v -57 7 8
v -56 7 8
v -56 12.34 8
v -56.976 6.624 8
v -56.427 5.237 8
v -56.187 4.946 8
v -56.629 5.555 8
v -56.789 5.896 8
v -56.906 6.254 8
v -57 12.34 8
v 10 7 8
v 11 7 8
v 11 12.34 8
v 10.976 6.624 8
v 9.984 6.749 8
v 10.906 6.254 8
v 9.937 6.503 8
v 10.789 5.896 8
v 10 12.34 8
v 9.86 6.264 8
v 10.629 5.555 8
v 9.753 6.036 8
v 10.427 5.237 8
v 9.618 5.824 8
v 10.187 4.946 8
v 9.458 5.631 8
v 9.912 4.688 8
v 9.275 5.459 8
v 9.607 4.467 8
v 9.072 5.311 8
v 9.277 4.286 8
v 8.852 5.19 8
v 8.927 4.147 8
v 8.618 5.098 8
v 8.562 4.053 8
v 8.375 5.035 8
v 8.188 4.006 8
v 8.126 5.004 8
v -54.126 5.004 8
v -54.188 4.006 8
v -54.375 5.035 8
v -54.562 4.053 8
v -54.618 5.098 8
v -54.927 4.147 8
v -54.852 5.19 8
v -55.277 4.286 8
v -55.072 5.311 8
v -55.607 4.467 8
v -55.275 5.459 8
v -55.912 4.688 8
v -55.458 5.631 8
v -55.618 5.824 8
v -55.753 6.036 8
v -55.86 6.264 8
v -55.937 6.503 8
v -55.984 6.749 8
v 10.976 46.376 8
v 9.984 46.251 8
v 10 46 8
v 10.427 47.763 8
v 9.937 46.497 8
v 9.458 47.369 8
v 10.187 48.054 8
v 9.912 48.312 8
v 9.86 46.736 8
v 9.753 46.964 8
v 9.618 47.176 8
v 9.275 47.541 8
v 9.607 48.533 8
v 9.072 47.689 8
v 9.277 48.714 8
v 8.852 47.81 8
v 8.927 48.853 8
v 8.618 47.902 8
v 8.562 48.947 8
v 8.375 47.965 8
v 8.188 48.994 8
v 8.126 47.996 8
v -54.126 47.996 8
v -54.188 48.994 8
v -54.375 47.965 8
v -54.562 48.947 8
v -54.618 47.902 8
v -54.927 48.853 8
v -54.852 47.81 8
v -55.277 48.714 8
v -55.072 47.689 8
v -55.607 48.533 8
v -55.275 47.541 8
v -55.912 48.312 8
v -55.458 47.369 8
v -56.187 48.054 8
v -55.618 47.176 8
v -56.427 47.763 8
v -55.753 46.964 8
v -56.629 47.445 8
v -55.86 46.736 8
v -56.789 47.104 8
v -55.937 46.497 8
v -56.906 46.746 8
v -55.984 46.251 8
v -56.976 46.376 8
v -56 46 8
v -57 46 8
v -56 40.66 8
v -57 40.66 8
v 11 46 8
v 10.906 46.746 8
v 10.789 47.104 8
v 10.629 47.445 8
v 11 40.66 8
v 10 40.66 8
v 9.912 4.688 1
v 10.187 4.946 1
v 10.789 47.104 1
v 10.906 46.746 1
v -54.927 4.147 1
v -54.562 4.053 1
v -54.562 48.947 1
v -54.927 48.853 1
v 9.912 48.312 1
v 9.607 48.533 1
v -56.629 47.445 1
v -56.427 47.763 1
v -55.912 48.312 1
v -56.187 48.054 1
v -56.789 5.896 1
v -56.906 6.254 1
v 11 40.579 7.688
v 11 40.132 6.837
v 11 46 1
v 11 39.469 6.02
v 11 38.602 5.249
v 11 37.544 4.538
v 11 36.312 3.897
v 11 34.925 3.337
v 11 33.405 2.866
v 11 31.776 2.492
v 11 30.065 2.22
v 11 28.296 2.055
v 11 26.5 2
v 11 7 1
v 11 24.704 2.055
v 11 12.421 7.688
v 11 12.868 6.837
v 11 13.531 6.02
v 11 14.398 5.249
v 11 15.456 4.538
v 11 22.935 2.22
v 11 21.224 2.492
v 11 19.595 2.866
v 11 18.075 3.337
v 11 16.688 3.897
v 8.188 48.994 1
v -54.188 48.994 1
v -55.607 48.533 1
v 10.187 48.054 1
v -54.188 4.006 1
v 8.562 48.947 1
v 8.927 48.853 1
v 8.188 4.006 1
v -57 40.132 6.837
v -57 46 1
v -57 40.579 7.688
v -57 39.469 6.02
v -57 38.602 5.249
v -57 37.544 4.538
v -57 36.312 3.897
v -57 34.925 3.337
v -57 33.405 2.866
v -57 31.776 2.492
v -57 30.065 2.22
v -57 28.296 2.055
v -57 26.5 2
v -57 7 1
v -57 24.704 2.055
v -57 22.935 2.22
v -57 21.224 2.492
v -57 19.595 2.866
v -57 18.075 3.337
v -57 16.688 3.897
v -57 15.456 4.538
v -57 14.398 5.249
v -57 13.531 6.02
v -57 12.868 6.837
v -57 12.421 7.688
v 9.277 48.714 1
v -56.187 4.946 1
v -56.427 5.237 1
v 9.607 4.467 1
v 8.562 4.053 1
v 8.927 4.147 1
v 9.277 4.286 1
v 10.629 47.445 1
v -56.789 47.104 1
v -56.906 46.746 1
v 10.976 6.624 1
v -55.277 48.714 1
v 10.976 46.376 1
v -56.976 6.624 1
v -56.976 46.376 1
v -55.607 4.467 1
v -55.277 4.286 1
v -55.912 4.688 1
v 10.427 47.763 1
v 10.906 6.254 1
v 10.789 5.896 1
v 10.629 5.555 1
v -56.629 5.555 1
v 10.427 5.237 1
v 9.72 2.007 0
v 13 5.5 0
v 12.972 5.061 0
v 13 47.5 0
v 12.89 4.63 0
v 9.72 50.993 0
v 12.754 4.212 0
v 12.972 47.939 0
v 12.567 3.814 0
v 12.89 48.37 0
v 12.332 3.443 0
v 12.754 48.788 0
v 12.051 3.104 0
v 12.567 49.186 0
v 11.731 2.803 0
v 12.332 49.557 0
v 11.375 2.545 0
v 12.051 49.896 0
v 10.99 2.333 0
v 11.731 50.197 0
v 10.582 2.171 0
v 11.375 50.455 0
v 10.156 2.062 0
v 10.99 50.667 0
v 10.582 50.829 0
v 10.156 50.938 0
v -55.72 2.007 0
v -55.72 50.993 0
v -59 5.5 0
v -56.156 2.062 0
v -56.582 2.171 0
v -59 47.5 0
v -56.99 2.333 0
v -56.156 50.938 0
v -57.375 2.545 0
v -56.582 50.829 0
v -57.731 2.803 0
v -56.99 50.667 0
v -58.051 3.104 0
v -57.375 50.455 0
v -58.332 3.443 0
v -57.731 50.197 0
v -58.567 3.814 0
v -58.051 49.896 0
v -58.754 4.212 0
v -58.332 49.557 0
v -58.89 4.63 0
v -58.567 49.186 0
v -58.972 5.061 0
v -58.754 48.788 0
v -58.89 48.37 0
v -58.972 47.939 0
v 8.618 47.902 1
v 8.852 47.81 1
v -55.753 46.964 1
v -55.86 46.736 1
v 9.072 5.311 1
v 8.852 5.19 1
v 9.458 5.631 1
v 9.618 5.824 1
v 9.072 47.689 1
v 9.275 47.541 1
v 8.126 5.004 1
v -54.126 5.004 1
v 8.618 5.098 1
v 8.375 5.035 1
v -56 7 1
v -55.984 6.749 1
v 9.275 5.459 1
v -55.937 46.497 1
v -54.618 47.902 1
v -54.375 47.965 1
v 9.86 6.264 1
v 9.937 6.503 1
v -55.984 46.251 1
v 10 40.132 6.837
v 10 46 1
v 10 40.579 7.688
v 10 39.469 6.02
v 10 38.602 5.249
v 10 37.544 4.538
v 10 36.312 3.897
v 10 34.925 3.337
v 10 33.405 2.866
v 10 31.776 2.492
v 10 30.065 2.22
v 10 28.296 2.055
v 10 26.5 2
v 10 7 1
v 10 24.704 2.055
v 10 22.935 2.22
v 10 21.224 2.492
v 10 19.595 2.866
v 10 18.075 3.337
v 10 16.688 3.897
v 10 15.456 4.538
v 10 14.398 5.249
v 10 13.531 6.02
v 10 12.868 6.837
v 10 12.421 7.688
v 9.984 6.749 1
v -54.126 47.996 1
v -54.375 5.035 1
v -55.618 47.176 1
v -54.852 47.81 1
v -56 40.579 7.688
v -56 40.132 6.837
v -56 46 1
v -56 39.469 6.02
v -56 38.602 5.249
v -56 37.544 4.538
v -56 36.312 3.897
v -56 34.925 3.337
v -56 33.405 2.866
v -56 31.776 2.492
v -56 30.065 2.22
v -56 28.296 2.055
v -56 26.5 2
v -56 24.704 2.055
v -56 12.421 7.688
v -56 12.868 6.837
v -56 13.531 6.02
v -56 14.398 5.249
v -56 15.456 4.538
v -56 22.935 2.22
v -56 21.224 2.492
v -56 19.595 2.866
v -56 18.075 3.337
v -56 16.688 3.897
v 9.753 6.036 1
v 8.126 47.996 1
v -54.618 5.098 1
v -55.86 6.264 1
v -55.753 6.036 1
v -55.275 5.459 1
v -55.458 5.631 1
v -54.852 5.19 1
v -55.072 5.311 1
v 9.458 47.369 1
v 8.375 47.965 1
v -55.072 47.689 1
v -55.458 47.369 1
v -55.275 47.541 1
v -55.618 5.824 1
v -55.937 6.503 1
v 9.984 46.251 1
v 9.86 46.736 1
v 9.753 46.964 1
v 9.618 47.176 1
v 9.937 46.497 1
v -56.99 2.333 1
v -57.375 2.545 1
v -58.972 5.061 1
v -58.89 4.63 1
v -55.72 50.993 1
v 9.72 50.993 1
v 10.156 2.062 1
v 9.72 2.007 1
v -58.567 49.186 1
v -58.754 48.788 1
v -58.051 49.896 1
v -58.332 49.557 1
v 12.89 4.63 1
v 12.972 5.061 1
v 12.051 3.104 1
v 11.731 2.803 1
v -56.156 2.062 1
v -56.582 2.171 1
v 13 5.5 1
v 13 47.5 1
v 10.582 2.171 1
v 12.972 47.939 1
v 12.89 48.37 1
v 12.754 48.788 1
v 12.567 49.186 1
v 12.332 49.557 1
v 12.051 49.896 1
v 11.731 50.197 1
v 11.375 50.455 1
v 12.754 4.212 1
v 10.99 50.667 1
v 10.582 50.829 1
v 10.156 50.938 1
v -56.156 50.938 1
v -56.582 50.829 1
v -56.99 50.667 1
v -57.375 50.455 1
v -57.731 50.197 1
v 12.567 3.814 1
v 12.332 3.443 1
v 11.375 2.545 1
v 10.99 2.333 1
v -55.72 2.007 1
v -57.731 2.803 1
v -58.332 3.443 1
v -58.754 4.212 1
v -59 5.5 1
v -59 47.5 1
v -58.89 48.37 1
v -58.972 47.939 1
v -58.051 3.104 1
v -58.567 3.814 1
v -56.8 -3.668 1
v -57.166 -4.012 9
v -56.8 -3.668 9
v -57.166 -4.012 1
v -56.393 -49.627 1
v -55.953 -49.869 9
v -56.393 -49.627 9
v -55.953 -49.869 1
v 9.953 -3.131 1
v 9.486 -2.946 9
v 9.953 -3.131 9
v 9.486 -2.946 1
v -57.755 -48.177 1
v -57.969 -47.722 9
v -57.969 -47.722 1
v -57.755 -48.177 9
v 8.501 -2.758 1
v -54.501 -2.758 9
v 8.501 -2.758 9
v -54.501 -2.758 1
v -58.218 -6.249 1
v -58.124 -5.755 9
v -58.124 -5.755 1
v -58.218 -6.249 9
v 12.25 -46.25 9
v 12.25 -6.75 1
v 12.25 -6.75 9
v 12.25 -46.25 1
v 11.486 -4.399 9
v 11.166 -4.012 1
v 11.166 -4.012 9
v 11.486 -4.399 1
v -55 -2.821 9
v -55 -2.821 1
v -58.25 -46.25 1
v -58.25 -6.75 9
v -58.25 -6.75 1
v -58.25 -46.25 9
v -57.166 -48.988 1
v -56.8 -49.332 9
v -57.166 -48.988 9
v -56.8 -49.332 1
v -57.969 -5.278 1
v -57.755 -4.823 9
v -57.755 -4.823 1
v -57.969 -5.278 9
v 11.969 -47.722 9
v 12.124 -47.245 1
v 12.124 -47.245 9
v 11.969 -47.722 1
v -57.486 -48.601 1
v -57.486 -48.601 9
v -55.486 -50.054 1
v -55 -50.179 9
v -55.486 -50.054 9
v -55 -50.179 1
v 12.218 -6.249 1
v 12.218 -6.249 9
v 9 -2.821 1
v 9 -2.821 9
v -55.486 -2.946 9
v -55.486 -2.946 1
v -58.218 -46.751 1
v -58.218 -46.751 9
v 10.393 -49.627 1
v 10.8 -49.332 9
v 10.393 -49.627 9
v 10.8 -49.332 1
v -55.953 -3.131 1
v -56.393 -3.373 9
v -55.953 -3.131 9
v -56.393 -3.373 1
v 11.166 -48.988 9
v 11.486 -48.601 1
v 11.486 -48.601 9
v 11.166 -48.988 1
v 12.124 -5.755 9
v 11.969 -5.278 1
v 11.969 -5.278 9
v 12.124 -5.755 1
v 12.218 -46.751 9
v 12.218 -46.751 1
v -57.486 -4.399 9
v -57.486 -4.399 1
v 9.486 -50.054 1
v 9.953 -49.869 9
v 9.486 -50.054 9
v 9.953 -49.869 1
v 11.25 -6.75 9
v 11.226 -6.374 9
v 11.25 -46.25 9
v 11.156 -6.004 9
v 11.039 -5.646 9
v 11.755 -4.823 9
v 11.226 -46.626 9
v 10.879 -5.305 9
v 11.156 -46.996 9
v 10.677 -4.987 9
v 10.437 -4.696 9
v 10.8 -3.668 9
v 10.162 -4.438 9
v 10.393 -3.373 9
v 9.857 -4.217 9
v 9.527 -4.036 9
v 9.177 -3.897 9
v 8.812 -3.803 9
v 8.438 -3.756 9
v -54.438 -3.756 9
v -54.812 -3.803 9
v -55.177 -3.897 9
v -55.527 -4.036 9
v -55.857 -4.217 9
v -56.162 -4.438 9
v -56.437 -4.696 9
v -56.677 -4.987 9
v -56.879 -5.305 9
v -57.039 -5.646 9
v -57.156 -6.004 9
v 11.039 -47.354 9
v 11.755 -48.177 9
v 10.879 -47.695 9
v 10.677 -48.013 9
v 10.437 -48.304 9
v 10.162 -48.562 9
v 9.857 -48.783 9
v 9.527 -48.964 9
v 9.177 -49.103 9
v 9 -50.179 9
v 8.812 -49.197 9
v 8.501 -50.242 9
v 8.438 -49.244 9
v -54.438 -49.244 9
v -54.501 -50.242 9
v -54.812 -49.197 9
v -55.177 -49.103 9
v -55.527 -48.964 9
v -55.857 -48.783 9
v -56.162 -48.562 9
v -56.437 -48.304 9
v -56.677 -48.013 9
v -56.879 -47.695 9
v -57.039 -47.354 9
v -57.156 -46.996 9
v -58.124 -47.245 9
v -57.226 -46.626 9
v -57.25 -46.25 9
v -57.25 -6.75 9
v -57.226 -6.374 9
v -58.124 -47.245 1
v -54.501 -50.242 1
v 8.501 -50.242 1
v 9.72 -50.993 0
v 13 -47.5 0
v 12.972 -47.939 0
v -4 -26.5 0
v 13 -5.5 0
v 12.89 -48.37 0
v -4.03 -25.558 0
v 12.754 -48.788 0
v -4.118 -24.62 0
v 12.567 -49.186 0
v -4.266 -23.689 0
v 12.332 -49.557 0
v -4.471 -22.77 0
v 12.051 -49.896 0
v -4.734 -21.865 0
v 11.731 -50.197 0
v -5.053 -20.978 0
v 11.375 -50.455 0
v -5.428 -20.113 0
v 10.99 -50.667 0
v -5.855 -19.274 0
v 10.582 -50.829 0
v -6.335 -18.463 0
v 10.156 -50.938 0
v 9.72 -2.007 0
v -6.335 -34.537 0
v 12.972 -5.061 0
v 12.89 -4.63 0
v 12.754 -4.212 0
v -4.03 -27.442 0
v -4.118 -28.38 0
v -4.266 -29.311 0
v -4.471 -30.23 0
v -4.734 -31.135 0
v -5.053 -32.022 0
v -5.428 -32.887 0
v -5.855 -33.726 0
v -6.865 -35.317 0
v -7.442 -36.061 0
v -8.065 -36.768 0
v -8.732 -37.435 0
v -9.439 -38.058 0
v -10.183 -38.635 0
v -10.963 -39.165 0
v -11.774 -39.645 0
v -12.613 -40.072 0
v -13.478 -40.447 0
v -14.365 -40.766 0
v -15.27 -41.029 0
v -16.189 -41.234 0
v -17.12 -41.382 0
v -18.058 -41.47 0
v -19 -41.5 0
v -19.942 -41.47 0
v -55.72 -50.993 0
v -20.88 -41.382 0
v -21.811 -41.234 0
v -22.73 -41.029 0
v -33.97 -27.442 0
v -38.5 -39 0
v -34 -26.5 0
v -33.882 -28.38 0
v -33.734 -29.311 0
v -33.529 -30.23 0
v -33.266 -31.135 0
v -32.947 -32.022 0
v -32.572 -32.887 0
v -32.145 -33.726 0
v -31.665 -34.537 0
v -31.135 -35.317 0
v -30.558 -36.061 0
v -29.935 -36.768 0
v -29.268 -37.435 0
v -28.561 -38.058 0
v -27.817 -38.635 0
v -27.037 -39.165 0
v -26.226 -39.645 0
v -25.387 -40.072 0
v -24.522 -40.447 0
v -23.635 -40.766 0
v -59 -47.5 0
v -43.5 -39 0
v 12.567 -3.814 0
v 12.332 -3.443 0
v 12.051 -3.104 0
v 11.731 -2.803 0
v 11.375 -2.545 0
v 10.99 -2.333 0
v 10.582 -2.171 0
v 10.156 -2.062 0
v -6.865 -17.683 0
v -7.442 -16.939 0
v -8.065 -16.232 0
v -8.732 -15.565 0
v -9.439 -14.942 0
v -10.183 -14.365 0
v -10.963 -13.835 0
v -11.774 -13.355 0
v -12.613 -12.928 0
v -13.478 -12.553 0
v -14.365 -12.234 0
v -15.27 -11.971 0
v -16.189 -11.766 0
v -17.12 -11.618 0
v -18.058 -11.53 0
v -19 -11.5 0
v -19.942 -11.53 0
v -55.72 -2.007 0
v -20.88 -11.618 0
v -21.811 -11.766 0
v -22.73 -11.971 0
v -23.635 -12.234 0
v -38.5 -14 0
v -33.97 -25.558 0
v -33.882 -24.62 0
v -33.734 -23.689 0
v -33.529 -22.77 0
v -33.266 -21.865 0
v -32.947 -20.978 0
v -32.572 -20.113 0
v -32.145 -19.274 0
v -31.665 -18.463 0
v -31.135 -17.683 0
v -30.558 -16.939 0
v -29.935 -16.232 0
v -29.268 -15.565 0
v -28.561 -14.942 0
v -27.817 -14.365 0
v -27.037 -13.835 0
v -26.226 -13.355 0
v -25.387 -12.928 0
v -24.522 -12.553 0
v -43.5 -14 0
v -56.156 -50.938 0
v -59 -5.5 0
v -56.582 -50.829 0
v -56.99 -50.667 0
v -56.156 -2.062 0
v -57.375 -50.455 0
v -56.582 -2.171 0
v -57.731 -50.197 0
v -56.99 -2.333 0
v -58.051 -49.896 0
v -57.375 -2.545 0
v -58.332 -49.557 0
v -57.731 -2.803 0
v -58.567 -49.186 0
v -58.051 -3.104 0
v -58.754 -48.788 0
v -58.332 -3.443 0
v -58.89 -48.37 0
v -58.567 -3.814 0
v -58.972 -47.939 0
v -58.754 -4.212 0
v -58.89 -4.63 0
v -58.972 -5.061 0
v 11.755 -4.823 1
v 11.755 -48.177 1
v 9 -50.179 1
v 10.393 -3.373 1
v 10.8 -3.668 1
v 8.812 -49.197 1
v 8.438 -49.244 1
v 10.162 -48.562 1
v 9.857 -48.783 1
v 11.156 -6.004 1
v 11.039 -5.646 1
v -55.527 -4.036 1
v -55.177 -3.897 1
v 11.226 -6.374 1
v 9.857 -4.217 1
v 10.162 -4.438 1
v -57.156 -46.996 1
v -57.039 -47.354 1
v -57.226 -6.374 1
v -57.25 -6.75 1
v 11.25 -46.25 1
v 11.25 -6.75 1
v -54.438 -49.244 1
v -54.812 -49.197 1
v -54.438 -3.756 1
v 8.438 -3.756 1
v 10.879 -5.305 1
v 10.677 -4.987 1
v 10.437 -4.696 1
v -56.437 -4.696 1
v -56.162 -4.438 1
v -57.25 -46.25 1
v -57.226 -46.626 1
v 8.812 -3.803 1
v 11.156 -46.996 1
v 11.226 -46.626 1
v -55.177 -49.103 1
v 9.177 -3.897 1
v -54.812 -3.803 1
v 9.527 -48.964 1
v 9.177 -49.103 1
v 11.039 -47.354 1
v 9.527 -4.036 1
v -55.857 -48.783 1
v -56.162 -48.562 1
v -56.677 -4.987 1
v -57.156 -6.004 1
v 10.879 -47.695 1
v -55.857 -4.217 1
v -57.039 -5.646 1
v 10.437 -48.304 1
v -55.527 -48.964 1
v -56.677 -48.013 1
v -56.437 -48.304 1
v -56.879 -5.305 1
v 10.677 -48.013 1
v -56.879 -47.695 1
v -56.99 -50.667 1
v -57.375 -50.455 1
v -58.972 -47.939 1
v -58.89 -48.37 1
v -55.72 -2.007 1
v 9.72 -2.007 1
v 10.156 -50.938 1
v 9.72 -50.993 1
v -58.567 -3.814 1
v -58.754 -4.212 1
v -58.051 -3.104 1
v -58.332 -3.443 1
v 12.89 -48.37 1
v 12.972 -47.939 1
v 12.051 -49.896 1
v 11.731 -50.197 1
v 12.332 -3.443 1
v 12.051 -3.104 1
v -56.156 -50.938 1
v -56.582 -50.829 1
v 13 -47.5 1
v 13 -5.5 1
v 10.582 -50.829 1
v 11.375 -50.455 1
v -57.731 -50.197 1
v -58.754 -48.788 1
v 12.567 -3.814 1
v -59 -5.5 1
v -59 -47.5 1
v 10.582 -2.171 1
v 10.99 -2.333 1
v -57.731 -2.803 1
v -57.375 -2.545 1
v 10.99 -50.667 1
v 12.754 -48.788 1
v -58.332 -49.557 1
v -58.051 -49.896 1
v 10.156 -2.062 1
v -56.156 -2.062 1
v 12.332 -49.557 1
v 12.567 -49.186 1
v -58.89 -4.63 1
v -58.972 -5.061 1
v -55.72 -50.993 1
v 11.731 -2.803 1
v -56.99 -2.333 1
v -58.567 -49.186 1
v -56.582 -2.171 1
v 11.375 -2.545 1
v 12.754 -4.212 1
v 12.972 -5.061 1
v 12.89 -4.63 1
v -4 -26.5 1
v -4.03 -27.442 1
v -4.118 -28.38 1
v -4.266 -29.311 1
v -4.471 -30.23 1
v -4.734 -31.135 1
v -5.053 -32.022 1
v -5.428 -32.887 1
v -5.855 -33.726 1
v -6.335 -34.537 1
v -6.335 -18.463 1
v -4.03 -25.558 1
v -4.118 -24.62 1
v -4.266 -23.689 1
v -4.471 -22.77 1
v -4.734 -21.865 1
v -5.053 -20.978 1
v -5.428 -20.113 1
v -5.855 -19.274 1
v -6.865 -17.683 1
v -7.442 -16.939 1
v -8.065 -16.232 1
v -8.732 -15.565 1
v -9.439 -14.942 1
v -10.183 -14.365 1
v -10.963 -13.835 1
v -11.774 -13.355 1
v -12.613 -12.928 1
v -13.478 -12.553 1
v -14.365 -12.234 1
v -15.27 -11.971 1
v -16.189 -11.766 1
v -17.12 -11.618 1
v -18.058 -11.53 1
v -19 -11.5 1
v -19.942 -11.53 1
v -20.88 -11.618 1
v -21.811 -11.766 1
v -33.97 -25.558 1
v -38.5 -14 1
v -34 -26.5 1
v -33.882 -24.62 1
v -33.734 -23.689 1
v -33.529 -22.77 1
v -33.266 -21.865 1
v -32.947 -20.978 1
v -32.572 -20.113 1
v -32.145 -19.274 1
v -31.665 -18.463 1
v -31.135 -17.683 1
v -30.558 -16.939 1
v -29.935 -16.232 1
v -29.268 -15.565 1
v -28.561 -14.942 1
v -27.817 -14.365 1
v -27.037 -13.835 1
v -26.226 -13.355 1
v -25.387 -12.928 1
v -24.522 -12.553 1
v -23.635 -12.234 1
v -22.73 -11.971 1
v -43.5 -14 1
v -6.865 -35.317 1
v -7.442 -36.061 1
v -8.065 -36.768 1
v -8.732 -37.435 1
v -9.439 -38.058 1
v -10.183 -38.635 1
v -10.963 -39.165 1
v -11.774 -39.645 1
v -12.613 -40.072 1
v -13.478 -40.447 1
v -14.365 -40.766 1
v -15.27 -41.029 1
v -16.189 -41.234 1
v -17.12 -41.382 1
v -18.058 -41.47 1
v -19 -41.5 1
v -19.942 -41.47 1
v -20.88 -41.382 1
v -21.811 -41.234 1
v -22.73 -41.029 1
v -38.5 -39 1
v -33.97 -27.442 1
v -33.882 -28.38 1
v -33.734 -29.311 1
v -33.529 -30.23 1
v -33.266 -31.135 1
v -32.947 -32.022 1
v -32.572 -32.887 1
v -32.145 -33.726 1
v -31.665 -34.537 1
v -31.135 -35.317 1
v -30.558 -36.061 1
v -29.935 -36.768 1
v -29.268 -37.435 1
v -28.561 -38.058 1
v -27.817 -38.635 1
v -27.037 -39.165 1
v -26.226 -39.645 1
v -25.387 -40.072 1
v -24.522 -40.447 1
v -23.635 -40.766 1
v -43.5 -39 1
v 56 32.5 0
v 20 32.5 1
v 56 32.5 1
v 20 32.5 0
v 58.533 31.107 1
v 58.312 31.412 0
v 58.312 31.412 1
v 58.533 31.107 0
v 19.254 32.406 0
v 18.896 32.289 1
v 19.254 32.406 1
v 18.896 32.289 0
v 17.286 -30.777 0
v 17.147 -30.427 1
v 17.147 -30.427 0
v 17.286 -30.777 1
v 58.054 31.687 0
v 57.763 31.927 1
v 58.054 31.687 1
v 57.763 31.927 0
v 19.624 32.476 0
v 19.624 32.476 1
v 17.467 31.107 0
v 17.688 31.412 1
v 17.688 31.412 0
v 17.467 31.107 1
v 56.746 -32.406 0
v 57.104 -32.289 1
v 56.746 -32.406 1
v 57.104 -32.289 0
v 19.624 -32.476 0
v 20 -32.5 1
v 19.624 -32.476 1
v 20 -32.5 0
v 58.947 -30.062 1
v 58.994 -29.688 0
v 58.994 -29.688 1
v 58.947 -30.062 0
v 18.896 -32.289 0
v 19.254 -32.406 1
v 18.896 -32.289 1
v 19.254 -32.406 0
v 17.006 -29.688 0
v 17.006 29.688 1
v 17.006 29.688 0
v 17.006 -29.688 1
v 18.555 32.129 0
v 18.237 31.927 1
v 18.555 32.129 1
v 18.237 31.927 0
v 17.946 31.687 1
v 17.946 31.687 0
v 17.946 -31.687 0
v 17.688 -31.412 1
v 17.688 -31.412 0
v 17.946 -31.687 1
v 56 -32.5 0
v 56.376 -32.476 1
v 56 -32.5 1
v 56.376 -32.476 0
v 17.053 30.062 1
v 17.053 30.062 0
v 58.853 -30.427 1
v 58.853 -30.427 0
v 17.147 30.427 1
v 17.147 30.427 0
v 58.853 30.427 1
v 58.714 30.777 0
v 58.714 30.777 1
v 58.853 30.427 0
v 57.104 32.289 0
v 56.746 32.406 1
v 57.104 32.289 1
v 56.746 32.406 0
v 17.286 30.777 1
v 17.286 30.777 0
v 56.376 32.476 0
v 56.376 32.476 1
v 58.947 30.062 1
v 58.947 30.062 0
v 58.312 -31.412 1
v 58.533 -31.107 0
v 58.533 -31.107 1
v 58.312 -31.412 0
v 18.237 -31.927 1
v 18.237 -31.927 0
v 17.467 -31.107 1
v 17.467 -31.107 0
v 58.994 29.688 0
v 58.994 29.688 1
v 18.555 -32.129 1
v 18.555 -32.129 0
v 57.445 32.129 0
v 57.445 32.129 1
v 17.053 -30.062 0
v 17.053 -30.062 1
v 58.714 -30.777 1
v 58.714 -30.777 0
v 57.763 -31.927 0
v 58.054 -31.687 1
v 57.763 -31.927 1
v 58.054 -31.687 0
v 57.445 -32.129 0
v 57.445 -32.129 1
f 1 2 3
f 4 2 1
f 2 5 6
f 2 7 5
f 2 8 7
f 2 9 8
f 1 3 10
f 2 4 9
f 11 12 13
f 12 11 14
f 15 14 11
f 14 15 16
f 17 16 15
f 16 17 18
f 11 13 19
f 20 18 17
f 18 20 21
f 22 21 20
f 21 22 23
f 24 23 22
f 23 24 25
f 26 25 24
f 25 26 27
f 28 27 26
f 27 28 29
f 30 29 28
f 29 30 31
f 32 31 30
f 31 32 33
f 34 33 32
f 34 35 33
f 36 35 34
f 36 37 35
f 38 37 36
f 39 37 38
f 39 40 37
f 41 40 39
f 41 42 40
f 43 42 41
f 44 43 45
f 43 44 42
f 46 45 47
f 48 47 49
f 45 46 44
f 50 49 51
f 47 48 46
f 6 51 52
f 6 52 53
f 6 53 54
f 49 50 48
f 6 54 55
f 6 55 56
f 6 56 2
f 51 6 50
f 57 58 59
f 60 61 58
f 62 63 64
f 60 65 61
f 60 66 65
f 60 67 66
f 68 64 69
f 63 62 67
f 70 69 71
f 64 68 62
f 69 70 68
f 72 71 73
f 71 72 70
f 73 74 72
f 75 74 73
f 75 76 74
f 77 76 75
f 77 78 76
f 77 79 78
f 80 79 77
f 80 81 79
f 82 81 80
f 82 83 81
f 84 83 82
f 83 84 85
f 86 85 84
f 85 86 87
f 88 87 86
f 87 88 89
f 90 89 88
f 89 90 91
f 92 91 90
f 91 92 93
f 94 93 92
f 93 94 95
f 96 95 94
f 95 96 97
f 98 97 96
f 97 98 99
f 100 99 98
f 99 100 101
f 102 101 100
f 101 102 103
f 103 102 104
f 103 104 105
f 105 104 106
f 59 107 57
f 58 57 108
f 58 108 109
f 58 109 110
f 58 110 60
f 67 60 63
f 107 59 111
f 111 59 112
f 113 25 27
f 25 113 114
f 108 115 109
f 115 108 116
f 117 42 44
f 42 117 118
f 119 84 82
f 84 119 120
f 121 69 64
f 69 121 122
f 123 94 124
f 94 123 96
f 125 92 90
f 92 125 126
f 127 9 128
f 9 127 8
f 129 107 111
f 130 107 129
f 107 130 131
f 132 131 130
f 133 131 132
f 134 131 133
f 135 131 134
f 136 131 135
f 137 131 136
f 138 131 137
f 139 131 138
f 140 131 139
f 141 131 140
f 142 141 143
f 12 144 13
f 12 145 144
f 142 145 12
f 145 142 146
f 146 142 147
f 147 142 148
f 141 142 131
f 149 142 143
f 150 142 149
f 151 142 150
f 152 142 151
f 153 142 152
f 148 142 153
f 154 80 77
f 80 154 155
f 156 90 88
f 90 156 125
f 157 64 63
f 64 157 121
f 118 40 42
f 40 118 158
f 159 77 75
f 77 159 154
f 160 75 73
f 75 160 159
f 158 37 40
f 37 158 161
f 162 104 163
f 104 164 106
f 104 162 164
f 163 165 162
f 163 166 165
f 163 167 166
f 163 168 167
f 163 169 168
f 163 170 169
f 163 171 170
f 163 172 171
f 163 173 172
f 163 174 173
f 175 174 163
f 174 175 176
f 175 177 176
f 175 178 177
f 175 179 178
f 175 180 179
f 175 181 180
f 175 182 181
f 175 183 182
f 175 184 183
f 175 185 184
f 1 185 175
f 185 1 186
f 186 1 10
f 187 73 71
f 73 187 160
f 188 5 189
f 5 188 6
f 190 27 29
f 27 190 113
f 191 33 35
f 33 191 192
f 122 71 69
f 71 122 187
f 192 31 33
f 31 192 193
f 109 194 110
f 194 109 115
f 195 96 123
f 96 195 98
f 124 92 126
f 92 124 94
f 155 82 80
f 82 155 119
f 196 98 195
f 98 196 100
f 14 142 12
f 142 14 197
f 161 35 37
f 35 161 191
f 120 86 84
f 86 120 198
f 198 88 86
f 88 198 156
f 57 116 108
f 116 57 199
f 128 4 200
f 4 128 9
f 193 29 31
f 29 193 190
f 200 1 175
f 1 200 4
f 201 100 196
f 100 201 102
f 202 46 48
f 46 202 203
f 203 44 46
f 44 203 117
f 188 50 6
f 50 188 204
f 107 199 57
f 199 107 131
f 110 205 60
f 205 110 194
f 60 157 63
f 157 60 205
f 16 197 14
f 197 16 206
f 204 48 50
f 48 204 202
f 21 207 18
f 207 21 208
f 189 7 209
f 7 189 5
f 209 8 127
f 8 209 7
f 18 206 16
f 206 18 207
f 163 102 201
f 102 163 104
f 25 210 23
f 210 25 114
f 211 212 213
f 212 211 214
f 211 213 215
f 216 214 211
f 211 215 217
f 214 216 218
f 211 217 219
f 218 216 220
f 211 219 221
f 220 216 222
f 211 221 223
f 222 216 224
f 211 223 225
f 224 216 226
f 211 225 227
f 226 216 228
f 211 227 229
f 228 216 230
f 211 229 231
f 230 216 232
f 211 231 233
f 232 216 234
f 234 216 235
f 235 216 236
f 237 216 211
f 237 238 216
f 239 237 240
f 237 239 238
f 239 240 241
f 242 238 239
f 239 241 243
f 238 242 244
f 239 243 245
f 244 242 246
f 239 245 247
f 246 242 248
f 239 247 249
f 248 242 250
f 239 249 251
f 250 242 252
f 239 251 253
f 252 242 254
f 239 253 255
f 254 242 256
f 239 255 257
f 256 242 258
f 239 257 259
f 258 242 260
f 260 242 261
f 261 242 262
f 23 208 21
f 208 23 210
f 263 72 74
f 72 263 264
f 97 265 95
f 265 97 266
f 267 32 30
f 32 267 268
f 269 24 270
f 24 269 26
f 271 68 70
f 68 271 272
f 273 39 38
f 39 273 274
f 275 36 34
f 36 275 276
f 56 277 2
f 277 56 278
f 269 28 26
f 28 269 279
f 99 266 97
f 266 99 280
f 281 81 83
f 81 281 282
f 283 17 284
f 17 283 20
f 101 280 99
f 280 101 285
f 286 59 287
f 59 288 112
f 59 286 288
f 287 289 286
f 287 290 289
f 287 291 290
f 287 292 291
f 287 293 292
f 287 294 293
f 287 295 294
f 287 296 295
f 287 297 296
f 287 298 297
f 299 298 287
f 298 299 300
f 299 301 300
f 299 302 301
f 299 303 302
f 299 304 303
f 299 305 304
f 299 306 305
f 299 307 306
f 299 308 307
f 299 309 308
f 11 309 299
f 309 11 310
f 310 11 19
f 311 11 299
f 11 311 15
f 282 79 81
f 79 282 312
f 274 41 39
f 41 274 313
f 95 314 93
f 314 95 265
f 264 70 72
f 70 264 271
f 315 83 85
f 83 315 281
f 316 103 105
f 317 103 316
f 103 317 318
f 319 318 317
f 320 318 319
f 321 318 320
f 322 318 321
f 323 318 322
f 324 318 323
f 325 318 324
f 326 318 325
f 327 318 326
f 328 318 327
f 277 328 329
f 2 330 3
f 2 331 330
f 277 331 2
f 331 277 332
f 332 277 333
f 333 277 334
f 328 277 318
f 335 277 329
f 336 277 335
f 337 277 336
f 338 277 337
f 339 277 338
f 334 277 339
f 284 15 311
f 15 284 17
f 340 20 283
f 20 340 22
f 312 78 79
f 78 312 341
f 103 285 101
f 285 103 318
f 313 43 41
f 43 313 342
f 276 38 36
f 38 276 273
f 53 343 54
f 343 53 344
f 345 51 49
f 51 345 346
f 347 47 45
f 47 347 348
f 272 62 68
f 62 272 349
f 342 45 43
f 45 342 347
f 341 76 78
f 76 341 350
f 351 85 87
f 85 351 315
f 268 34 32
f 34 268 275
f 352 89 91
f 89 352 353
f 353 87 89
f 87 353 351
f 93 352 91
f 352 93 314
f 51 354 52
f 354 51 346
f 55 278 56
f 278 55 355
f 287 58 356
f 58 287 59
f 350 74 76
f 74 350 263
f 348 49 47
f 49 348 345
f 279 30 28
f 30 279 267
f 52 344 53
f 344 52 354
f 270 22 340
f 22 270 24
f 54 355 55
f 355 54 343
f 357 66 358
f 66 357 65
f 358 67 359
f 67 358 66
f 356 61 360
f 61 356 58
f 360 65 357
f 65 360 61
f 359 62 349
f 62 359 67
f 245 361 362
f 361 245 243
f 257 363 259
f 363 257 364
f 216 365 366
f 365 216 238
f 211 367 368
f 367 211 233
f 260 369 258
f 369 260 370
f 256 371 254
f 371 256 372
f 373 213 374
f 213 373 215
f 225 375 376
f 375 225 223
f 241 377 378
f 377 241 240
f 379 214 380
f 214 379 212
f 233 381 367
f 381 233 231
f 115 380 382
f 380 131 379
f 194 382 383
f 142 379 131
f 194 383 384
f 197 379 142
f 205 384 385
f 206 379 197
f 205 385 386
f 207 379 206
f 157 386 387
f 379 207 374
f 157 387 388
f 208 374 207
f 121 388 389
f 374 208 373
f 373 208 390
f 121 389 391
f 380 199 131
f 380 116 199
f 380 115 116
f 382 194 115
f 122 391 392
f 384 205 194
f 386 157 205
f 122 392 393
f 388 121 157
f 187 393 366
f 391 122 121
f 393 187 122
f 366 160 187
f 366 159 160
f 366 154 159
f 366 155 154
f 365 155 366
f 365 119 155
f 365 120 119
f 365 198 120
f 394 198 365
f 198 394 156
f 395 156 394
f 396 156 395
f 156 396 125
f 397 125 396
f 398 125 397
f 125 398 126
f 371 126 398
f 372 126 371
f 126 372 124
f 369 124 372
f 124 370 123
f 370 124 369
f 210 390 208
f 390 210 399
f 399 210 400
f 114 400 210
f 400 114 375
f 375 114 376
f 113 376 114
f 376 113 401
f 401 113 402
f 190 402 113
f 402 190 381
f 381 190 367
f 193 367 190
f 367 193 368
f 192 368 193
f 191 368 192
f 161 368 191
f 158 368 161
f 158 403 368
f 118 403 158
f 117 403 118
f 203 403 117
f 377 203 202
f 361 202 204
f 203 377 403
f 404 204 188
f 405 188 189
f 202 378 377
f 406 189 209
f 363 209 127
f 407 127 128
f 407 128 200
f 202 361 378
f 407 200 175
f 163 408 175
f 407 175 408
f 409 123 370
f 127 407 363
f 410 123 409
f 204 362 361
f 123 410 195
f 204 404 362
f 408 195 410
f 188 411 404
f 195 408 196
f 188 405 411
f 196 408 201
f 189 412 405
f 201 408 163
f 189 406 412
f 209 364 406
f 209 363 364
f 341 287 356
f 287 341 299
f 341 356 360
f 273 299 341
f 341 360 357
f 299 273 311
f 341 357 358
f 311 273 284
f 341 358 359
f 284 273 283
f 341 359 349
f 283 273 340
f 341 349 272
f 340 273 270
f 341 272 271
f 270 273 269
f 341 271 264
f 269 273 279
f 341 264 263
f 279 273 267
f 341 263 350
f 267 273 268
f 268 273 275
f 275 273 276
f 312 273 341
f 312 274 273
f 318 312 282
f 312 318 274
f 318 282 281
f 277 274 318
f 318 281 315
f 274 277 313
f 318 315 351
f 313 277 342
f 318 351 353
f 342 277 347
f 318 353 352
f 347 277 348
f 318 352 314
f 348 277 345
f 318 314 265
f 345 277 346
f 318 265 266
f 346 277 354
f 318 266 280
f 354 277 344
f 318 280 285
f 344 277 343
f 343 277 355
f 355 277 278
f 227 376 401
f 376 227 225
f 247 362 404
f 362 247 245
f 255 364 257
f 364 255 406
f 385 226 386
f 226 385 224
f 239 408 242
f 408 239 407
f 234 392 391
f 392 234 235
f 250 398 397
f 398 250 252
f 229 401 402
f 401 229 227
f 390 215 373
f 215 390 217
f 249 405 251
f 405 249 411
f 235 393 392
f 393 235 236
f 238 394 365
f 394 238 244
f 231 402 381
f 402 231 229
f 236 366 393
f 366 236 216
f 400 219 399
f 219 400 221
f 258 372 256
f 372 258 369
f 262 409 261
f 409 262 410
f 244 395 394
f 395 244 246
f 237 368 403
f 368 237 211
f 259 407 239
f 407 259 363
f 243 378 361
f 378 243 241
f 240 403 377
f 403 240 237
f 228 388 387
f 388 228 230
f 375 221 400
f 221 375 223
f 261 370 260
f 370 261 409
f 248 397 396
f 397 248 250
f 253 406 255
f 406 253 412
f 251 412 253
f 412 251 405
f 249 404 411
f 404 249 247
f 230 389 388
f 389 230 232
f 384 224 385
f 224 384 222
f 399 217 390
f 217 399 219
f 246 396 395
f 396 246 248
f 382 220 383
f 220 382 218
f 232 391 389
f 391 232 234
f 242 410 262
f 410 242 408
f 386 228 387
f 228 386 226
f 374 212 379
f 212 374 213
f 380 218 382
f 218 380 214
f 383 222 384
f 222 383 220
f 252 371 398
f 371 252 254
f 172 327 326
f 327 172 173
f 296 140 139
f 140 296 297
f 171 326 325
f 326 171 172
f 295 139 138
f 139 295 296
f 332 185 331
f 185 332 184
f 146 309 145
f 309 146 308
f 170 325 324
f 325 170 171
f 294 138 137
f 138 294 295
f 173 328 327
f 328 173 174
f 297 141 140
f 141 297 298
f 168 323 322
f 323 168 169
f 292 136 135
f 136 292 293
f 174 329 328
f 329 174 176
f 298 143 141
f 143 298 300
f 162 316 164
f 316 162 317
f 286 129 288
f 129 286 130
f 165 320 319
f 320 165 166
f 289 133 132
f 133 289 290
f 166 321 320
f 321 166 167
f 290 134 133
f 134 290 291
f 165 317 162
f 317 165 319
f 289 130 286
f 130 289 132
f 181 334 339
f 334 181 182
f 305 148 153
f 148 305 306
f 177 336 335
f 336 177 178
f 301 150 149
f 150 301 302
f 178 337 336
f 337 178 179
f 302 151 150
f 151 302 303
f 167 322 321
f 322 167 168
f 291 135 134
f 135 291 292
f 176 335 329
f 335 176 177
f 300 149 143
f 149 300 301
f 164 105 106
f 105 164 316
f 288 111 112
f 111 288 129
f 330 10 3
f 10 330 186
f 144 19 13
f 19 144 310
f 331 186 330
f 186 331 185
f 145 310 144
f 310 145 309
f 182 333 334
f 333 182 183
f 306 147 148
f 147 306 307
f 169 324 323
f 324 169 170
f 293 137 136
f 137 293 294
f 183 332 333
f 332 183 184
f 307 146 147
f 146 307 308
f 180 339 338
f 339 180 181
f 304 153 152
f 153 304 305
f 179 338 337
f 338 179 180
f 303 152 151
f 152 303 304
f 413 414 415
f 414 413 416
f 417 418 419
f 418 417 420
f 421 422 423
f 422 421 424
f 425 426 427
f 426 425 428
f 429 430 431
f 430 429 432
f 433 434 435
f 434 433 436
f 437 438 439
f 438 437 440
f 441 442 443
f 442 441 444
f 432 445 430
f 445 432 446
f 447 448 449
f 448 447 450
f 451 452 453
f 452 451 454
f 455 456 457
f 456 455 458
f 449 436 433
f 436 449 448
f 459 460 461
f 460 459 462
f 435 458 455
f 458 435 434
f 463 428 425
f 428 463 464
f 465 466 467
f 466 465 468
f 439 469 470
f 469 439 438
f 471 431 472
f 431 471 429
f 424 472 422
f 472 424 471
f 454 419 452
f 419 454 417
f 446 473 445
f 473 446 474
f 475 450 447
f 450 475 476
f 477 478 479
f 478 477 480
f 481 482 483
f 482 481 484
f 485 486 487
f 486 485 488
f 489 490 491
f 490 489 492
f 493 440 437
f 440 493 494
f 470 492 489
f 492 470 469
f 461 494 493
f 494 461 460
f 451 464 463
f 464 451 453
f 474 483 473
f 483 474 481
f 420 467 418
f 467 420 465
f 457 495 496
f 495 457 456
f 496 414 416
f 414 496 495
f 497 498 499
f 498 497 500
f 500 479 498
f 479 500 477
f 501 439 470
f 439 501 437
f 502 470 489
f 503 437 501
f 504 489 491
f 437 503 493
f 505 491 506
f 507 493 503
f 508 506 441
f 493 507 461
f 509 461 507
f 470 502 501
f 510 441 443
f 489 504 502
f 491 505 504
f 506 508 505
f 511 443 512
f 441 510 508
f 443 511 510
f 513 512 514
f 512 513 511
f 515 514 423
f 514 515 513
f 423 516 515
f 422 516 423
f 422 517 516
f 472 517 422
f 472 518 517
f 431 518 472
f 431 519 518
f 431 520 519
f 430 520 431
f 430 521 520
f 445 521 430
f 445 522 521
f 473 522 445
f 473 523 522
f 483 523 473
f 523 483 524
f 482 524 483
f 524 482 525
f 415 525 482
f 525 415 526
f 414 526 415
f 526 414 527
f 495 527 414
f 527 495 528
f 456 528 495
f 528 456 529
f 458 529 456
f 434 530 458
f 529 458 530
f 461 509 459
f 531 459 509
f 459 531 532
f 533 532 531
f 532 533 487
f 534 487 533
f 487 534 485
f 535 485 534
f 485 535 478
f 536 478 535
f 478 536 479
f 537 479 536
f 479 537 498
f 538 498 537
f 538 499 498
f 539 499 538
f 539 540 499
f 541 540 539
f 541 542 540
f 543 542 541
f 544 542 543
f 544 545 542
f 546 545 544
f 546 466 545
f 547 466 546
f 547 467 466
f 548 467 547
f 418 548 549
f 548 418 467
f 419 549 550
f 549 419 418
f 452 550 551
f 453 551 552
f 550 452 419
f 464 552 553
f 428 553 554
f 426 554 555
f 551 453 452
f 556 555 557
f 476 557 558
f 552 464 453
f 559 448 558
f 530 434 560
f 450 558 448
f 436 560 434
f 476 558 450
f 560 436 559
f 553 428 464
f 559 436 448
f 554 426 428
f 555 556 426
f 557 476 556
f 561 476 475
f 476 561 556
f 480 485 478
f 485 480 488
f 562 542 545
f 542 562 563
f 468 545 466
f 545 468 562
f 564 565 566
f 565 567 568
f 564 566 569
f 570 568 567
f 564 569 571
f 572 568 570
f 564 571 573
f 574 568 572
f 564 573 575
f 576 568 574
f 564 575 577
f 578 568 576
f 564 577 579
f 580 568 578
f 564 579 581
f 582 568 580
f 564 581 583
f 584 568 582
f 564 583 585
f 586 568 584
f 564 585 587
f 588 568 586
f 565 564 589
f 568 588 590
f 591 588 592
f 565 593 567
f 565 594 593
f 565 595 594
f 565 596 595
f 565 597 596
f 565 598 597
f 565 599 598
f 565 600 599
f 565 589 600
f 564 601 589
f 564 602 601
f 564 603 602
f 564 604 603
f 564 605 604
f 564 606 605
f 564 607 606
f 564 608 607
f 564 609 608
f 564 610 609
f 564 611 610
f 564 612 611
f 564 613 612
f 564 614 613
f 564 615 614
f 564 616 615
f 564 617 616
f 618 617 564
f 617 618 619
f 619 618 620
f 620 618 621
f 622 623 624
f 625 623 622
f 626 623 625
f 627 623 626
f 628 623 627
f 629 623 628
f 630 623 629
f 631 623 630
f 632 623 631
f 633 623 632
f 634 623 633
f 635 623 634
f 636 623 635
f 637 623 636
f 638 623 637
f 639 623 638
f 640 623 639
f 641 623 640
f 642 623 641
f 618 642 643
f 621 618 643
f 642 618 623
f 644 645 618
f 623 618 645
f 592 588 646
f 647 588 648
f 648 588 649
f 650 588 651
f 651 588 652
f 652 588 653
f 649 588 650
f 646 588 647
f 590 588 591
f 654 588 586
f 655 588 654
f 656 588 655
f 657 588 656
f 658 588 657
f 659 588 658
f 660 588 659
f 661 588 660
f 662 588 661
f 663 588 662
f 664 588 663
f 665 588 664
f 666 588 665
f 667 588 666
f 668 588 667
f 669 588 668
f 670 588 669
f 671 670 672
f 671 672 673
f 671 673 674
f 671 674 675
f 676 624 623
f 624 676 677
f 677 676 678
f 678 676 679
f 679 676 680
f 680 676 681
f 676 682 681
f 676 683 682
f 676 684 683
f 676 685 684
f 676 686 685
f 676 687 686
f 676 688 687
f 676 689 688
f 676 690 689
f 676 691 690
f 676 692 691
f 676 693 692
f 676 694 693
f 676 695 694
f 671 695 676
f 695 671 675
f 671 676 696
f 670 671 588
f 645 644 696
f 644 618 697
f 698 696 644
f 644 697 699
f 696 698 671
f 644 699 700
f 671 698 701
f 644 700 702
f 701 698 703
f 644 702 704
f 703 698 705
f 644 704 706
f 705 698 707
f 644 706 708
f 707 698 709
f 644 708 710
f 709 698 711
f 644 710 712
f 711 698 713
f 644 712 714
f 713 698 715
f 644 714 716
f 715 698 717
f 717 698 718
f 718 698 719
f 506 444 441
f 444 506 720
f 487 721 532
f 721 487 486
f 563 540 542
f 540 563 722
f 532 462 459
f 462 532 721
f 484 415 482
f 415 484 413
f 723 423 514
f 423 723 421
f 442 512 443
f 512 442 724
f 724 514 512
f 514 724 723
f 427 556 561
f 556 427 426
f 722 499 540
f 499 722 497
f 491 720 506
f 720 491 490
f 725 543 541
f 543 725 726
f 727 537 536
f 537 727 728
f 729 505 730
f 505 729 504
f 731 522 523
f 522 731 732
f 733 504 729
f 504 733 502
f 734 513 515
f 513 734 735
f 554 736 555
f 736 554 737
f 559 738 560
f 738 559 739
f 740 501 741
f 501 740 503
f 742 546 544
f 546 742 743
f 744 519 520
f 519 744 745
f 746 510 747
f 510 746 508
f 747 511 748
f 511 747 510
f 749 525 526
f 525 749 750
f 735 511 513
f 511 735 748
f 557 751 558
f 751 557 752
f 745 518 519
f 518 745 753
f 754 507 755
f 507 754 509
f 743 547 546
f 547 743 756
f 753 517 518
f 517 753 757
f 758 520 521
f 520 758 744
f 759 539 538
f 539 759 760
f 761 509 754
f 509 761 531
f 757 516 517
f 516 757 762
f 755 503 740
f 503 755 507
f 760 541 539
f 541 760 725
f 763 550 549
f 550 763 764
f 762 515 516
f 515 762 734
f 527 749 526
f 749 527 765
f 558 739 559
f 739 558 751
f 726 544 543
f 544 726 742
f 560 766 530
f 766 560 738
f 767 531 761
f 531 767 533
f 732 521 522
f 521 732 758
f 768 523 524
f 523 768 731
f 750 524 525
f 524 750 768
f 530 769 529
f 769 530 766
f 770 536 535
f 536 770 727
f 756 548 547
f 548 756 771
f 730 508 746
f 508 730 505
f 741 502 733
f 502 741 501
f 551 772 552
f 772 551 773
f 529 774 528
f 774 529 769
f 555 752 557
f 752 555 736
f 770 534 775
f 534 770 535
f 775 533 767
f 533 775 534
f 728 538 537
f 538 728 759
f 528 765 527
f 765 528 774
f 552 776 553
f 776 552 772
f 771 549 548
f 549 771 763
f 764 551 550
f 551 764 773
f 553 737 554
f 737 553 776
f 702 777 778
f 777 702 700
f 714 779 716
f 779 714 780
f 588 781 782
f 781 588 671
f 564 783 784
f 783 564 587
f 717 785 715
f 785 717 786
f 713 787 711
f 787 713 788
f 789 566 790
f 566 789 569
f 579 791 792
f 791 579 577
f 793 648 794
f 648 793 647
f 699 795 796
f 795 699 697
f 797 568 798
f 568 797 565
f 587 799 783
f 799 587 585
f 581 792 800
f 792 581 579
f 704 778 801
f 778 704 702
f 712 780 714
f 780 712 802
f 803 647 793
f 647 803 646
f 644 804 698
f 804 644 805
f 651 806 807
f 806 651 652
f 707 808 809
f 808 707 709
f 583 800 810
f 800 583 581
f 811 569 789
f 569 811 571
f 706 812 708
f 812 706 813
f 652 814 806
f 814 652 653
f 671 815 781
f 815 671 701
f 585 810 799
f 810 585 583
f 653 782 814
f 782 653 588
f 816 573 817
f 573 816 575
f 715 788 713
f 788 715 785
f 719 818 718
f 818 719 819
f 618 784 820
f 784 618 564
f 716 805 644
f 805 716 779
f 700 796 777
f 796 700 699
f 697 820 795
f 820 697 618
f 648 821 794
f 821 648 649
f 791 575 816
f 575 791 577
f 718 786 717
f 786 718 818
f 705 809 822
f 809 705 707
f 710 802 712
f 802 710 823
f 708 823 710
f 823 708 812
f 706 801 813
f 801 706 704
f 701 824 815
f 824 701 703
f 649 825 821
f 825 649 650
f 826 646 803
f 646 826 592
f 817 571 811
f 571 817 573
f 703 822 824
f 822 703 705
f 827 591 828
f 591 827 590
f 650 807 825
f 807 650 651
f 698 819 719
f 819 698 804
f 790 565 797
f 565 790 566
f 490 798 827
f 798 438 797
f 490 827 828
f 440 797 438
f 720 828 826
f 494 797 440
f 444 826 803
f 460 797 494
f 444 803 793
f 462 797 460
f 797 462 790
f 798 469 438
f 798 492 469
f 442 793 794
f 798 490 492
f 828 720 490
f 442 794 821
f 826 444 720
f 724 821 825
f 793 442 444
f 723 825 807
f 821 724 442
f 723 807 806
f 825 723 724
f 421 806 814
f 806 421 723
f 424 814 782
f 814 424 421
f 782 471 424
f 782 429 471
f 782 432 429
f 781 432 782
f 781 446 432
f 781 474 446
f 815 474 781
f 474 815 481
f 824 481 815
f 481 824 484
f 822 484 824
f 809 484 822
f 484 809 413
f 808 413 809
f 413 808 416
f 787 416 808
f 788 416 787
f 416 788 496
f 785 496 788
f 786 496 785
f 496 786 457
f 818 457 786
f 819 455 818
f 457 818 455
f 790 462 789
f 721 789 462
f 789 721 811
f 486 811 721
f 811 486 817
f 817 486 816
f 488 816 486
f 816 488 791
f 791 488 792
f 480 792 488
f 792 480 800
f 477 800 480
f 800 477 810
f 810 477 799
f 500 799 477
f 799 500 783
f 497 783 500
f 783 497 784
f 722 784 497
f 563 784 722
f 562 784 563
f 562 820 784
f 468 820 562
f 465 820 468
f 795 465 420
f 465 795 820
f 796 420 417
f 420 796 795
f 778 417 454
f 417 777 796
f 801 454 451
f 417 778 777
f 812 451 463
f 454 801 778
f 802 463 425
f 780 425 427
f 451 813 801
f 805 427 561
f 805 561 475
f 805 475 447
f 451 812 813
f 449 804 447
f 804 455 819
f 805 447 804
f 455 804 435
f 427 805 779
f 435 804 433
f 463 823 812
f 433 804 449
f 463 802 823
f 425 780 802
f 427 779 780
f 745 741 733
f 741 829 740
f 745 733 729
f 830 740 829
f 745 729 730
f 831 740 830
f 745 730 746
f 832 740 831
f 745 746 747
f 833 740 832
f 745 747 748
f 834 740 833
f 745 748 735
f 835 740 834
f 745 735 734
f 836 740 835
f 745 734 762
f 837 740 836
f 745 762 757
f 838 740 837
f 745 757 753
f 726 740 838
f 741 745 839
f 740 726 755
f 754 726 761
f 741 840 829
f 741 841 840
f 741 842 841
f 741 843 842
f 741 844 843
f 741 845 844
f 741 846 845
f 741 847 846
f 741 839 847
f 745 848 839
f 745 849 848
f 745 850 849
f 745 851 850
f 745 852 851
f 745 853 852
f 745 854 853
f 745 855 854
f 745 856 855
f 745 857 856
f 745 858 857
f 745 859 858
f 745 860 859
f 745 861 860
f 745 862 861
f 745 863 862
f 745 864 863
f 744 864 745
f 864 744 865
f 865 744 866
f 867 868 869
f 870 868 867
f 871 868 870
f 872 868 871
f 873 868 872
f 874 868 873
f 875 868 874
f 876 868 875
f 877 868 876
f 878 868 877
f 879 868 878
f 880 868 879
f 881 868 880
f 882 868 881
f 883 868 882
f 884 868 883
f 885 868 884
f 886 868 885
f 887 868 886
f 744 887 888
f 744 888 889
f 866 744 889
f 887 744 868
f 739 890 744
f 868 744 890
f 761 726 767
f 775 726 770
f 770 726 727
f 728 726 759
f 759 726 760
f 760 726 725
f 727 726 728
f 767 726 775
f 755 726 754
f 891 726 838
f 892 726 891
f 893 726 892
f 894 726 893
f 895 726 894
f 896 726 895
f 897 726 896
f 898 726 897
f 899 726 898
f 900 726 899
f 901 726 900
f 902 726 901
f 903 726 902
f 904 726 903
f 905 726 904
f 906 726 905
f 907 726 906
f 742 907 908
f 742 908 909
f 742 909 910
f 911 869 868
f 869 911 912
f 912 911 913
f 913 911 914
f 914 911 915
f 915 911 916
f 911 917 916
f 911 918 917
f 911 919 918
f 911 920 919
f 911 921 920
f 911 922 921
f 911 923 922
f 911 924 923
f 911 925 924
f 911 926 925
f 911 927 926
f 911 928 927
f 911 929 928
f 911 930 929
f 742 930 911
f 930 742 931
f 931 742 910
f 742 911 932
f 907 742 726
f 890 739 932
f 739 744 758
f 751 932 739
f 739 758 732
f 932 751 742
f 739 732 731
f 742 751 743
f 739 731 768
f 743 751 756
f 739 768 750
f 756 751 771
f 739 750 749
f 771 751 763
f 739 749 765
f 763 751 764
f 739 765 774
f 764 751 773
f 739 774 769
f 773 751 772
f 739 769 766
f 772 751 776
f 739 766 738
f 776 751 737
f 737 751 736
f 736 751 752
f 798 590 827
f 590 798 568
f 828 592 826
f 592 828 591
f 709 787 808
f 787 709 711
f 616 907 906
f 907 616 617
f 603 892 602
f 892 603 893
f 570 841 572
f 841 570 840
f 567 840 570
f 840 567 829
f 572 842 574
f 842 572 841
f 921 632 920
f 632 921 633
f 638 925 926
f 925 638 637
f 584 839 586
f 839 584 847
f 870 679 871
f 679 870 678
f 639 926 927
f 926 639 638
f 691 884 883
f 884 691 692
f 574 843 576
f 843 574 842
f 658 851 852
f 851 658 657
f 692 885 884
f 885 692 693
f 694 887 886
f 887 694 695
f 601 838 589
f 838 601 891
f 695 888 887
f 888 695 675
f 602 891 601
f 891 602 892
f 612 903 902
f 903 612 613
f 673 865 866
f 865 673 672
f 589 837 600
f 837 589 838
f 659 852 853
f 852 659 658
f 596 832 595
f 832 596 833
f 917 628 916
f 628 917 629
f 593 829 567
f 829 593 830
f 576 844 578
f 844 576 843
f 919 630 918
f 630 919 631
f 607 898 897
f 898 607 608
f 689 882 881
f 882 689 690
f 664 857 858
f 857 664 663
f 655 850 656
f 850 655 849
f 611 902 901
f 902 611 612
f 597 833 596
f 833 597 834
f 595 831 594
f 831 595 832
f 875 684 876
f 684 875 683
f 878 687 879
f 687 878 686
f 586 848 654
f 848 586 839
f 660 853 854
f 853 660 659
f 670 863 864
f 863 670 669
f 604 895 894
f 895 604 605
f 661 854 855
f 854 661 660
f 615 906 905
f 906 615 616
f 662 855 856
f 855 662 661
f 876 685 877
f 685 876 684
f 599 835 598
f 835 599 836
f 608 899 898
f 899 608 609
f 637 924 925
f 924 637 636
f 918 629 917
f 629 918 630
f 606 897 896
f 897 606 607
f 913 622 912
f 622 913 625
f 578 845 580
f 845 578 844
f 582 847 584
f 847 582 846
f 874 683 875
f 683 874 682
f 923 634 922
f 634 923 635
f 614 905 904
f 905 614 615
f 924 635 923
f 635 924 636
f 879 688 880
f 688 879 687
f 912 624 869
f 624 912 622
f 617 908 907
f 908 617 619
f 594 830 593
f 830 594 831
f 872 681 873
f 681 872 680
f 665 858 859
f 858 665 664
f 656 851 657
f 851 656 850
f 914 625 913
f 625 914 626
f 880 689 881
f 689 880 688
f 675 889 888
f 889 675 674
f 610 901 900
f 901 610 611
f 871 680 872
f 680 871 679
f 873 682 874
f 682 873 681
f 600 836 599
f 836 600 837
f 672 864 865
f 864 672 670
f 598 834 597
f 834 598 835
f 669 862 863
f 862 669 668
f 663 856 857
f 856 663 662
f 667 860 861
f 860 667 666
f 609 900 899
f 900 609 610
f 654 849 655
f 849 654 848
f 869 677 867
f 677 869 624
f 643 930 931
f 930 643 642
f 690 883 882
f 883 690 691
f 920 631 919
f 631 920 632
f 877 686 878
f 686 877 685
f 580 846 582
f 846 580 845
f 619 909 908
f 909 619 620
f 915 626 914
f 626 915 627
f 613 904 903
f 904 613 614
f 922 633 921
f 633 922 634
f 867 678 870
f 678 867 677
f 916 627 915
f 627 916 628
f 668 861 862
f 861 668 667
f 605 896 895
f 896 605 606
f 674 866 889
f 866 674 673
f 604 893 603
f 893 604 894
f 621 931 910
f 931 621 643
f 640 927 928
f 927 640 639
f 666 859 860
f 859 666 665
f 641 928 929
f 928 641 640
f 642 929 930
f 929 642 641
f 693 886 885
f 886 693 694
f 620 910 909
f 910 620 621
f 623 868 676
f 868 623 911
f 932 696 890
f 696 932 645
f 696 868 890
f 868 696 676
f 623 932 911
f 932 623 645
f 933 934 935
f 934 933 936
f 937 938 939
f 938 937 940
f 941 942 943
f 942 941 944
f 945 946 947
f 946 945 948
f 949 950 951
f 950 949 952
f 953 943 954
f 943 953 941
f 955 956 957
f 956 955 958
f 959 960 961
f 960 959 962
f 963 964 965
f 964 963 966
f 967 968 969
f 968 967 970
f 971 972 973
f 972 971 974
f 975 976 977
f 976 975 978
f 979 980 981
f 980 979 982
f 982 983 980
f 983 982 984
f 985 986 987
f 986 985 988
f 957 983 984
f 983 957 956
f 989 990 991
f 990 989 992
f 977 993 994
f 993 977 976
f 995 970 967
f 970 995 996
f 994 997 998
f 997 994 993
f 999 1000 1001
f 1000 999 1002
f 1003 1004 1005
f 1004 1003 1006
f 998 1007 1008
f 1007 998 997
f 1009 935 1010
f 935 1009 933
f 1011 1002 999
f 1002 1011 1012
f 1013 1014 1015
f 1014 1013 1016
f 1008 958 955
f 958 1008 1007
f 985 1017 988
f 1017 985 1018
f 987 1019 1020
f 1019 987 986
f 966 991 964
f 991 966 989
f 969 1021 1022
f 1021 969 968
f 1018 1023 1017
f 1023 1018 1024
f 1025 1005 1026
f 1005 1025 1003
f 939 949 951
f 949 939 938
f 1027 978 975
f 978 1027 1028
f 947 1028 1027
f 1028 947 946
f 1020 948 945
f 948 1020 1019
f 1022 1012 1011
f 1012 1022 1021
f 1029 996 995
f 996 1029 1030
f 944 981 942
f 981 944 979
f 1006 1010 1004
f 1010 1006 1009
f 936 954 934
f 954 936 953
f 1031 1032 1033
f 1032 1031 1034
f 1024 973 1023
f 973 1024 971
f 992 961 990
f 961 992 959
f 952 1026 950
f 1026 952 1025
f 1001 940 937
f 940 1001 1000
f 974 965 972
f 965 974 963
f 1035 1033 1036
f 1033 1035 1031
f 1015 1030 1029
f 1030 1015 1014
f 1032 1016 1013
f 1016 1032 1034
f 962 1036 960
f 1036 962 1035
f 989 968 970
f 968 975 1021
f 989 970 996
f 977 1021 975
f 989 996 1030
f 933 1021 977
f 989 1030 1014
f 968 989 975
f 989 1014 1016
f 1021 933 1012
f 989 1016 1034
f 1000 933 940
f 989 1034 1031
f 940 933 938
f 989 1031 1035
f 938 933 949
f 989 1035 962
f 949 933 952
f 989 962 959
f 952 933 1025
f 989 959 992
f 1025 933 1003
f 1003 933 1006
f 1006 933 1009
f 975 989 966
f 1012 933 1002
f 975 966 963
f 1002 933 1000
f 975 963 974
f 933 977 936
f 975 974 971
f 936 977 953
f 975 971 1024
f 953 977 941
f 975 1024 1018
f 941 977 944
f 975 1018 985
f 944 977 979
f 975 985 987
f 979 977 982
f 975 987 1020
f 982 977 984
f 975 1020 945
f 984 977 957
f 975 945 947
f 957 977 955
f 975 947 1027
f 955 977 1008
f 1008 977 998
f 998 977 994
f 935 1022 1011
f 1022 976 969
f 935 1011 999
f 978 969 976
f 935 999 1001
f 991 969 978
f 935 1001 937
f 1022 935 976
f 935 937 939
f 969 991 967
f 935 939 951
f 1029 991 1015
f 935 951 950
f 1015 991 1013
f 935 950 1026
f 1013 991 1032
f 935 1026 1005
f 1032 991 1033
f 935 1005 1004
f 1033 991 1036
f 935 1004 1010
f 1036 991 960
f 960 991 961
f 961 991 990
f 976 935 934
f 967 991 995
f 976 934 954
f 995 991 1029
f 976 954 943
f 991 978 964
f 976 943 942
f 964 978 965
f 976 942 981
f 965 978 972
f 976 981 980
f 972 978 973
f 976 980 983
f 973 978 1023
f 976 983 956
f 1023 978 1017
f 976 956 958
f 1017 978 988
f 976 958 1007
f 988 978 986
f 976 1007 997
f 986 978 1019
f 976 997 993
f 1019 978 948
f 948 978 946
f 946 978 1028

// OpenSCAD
/*
	Watch out, because all the surfaces are thin.
	Slice with 100% infill
*/

/* [Basic Settings] */

// Which part to print?
part = 0; // [0:Everything, 1:Lid Only, 2:Base Only; 3:DividerOnly]

// Which type of box to print?
CardType = "class"; // [class:Character's class cards,overlord:Overlord cards,custom:Custom]

// Cut a big window to show the card symbol?
CutWindow = 1; //[1:Yes, 0:No]

// Cut a window to show the card label?
CutLabel = 1; //[1:Yes, 0:No]


/* [Settings for Custom] */

CustomHeight = 64;
CustomWidth = 41;
CustomThickness = 5;

CustomWindowX = 30;
CustomWindowY = 30;
CustomWindowOffset = 4;

CustomLabelX = 5;
CustomLabelY = 25;
CustomLabelOffset = -18;


/* [Advanced] */

// Thickness of the walls
t = 1;

// Margin around the cards
Margin = 2;

// Size of the overhang
Overhang = 5;

// Roundness
Roundness = 3;

// Small gap between the base and the lid
gap = 0.5;

/* [Hidden] */

// Sizes of the various predefined card types
ClassSize = [64, 41, 5];
ClassHole = [30, 30, 4]; // X,Y,Offset
ClassLabel = [5, 25, -18]; // X,Y,Offset

OverlordSize = [89, 58, 15];
OverlordHole = [60, 40, 0]; // X,Y,Offset
OverlordLabel = [0, 0, 0]; // X,Y,Offset

// Jitter to ensure there are no coincident-surface problems
j = 0.1;

// Roundness detail. Mostly $fn will be set to this
detail = 50;

// Shortcuts used to make arrays easier to reference
x=0; y=1; z=2;


module TopBottom(card)
{
	h=card[x]+Margin+t+Overhang;
	w=card[y]+Margin+t+Overhang;

	roundbox([h, w, t], Roundness+Overhang/2-t*2, 0);
}


module case(card, hole, label)
{
	if(part == 0)
	{
		translate([-((card[x]+Margin+t+Overhang)+4+(card[y] + Margin / 2))/2, 0, 0])
		translate([(card[x]+Margin+t+Overhang)/2, 0, 0])
		union()
		{
			translate([0, 2, 0])
			translate([0, (card[y]+Margin+t+Overhang)*0.5, 0])
			base(card);

			translate([0, -2, 0])
			translate([0, -(card[y]+Margin+t+Overhang)*0.5, 0])
			lid(card, hole, label);

			translate([4, 0, 0])
			translate([(card[y] + Margin / 2)/2, 0, 0])
			translate([(card[x]+Margin+t+Overhang)/2, 0, 0])
			rotate([0, 0, 90]) 
			divider(card);
		}
	}
	if(part == 1)
	{
		lid(card);
	}
	if(part == 2)
	{
		base(card);
	}
	if(part == 3)
	{
		divider(card);
	}
}


module divider(card)
{
	h=card[x] + Margin / 2;
	w=card[y] + Margin / 2;
	roundness=t*3;

	roundbox([h, w, t], roundness, 0);
}


module base(card)
{
	// The actual size of the base is a bit (one "t") bigger than a card
	h=card[x]+Margin;
	w=card[y]+Margin;
	d=card[z]+Margin;
	
	union()
	{
		difference()
		{
			union()
			{
				// Thin base (widest part)
				TopBottom(card);

				// Walls
				roundbox([h+t*2, w+t*2, d+t], Roundness, t);
			}

			// Thumb holes
			translate([0, 0, d+t*2]) scale([1, 1, d/(w/3)]) 
			rotate([0, 90, 0]) 
			cylinder(r=w/3, h=h+t*2+j*2, center=true, $fn=detail);
			
		}
	}
}


module lid(card, hole, label)
{
	// The outer size of the base is a bit (one "t") bigger than a card
	base_h=card[x]+Margin+t;
	base_w=card[y]+Margin+t;
	base_d=card[z]+Margin+t;
	
	// The size of the lid is a bit (gap) bigger than the base all around
	h=base_h+gap+t;
	w=base_w+gap+t;
	d=base_d;

	r=hole[x]/2;
	s=hole[x]/ (hole[y] == 0 ? 1 : hole[y]); // prevent DivZero
	o=hole[z];

	union()
	{
		difference()
		{
			union()
			{
				// Thin base (widest part)
				TopBottom(card);

				// Walls
				roundbox([h+t*2, w+t*2, d+t], Roundness+t, t);
			}

			if(CutWindow == 1 && hole[x] > 0 && hole[y] > 0)
			{
				// Window
				translate([o, 0, -j]) scale([1, 1/s, 1]) cylinder(r=r, h=t+j*2, $fn=detail*2);
			}
			
			if(CutLabel == 1 && label[x] > 0 && label[y] > 0)
			{
				translate([label[z], 0, t/2]) cube([label[x], label[y], t+j*2], center=true, $fn=detail);
			}
		}
	}
}


// Size is the outside dimension
module roundbox(size, r, t)
{
	difference()
	{
		hull()
		{
			translate([-r, -r, 0]) translate([ size[x]*0.5,  size[y]*0.5, 0]) cylinder(r=r, h=size[z], $fn=detail);
			translate([ r, -r, 0]) translate([-size[x]*0.5,  size[y]*0.5, 0]) cylinder(r=r, h=size[z], $fn=detail);
			translate([-r,  r, 0]) translate([ size[x]*0.5, -size[y]*0.5, 0]) cylinder(r=r, h=size[z], $fn=detail);
			translate([ r,  r, 0]) translate([-size[x]*0.5, -size[y]*0.5, 0]) cylinder(r=r, h=size[z], $fn=detail);
		}
		if(t>0)
		{
			hull()
			{
				translate([-r, -r, -j]) translate([ size[x]*0.5,  size[y]*0.5, 0]) cylinder(r=r-t, h=size[z]+j*2, $fn=detail);
				translate([ r, -r, -j]) translate([-size[x]*0.5,  size[y]*0.5, 0]) cylinder(r=r-t, h=size[z]+j*2, $fn=detail);
				translate([-r,  r, -j]) translate([ size[x]*0.5, -size[y]*0.5, 0]) cylinder(r=r-t, h=size[z]+j*2, $fn=detail);
				translate([ r,  r, -j]) translate([-size[x]*0.5, -size[y]*0.5, 0]) cylinder(r=r-t, h=size[z]+j*2, $fn=detail);
			}
		}
	}
}



if(CardType == "class")
{
	case(ClassSize, ClassHole, ClassLabel);
}
if(CardType == "overlord")
{
	case(OverlordSize, OverlordHole, OverlordLabel);
}
if(CardType == "custom")
{
	case(
		[CustomHeight, CustomWidth, CustomThickness], 
		[CustomWindowX, CustomWindowY, CustomWindowOffset], 
		[CustomLabelX, CustomLabelY, CustomLabelOffset]
	);
}
